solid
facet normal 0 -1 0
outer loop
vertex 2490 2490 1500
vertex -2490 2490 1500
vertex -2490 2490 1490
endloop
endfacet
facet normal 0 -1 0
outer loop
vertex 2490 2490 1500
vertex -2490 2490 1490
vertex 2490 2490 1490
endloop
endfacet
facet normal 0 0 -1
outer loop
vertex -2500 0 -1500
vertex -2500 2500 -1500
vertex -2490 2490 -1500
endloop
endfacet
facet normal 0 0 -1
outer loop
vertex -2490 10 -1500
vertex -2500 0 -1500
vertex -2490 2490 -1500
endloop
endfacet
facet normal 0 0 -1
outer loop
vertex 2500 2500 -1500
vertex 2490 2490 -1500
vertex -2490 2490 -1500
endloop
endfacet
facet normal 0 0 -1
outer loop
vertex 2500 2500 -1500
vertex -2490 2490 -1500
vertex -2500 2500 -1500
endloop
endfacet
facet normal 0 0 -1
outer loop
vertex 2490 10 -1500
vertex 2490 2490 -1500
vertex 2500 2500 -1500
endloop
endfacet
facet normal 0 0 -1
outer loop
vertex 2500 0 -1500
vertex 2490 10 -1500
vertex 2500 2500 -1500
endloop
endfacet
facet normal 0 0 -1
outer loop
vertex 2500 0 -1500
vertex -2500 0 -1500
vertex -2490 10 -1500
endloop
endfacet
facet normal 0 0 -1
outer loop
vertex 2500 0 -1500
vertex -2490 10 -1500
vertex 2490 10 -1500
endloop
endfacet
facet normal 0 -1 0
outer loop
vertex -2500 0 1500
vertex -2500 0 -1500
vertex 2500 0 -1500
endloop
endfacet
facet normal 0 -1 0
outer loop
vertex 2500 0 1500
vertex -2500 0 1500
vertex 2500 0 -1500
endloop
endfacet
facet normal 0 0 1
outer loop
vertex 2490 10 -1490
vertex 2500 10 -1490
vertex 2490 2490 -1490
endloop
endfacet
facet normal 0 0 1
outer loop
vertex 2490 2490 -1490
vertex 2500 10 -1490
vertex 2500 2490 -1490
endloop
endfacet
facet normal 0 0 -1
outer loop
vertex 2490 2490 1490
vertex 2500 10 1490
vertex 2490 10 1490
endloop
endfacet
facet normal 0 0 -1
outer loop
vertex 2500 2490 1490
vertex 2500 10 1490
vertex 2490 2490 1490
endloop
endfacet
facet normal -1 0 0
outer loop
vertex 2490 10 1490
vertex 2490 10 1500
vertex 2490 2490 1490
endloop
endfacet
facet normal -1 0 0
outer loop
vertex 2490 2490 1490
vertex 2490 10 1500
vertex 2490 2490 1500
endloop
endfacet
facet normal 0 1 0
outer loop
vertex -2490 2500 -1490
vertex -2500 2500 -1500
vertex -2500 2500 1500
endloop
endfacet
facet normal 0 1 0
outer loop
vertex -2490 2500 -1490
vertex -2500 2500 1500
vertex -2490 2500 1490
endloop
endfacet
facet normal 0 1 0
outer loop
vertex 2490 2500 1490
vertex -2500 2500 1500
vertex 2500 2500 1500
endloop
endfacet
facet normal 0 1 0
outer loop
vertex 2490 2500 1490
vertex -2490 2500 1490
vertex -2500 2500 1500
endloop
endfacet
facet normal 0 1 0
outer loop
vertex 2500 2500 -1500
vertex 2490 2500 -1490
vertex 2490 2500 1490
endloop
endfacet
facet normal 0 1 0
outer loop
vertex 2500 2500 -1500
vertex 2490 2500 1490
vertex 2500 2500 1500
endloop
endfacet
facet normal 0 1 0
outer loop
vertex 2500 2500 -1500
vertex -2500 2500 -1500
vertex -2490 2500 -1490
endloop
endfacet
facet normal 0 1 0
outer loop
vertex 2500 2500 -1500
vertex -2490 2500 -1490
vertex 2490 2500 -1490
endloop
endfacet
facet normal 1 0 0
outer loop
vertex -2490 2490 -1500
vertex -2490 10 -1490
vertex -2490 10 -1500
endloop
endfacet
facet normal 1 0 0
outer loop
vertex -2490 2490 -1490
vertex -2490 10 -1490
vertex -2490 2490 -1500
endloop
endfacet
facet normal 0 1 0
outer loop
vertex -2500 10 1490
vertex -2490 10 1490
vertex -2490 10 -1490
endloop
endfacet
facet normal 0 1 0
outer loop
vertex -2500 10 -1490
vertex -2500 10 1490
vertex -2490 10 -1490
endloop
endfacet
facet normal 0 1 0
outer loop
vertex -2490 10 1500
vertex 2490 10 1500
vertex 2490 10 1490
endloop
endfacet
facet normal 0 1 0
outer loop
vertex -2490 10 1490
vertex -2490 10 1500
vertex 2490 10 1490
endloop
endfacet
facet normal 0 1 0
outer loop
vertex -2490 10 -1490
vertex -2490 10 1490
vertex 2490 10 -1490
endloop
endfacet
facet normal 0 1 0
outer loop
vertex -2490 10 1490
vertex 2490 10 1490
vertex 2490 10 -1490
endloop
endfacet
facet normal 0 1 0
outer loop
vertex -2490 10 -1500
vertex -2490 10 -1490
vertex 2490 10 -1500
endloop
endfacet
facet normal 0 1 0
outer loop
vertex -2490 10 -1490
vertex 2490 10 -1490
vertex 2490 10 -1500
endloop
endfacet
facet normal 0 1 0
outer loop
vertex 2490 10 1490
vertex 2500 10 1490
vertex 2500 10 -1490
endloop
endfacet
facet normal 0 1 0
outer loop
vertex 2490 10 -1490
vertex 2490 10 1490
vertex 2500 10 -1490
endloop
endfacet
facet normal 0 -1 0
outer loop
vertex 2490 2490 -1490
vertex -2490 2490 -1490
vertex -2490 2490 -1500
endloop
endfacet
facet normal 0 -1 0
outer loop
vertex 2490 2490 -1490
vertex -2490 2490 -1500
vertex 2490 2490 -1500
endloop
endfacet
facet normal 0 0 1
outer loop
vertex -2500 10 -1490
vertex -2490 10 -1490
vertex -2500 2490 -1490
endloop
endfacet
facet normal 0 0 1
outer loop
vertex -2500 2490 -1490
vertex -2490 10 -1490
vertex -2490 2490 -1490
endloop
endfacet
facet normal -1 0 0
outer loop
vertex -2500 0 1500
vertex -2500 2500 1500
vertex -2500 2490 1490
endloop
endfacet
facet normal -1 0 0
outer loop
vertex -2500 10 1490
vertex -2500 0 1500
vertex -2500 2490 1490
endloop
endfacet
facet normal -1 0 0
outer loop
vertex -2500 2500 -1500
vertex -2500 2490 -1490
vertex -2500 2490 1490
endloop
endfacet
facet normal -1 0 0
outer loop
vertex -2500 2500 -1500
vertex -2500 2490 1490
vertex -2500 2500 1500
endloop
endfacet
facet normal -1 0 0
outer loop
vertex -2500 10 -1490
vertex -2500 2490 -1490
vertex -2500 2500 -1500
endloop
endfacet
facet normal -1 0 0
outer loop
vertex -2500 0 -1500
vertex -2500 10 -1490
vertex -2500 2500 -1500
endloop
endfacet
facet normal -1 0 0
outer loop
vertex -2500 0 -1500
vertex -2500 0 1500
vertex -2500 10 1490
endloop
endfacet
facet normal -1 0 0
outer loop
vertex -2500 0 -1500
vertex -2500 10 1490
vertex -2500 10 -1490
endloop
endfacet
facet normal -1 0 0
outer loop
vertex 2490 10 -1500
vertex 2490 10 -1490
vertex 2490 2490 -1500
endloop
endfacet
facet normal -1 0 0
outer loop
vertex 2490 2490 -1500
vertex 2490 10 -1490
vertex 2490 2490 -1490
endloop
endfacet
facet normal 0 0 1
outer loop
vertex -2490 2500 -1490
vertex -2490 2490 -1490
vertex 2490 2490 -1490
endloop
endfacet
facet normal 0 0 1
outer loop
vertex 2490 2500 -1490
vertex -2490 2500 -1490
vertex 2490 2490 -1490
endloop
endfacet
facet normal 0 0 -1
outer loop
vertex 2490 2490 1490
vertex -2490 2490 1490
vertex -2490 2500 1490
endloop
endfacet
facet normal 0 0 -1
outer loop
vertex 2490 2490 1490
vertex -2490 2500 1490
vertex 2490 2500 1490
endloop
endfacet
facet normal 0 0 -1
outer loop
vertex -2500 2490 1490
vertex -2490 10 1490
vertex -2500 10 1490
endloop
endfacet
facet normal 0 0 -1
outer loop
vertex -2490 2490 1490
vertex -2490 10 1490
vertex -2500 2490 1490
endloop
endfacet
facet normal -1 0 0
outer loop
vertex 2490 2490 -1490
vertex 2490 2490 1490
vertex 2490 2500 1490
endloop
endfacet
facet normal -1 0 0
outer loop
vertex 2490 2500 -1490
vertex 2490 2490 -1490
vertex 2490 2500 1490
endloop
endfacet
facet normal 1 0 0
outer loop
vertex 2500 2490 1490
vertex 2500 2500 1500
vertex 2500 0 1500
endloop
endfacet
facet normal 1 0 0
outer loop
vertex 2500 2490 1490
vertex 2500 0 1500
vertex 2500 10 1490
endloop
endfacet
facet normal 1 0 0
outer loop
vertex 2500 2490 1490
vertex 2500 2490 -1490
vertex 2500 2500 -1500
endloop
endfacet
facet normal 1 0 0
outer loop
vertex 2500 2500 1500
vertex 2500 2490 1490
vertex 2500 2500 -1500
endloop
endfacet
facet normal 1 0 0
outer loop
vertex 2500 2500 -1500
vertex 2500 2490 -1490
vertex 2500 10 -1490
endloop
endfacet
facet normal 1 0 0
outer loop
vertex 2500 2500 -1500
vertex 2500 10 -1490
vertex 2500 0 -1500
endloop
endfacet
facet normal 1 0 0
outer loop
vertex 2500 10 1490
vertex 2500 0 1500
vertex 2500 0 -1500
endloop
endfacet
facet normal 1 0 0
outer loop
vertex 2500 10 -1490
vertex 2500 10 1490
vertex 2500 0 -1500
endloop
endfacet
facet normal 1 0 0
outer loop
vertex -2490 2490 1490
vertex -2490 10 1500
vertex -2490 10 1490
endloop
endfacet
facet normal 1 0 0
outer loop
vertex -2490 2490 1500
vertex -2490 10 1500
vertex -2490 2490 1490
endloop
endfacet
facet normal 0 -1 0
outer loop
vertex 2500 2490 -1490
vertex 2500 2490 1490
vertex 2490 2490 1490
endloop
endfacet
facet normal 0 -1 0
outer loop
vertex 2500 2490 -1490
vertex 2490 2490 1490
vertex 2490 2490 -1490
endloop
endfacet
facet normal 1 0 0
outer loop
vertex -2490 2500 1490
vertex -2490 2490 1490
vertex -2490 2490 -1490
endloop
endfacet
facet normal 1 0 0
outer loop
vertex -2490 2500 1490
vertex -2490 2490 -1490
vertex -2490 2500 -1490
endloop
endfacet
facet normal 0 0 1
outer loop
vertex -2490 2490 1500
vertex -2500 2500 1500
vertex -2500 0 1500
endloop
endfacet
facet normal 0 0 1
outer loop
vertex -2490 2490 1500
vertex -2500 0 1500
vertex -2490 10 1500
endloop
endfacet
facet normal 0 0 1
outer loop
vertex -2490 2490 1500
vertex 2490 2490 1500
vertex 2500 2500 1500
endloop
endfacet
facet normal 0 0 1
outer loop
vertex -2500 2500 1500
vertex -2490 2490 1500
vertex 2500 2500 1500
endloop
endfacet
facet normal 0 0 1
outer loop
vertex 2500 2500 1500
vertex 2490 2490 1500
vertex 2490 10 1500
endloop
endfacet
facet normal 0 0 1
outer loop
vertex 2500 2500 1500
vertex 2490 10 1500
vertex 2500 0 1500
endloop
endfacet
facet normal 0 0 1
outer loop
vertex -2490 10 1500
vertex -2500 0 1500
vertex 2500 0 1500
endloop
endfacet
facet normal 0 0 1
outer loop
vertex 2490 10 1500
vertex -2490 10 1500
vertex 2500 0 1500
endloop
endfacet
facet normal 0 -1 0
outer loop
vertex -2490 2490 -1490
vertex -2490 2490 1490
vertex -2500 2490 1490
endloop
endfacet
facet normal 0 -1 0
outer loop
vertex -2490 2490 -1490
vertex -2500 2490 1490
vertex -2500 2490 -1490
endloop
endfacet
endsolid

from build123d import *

# Parameters (mm, degrees)
SKETCH_1_W          = 5000
SKETCH_1_H          = 3000
EXTRUDE_1_DEPTH     = 2500
SHELL_1_T           = -10
SKETCH_4_W          = 4980
SKETCH_4_H          = 2480
CUT_EXTRUDE_5_DEPTH = 4637.809247748
SKETCH_5_W          = 2980
SKETCH_5_H          = 2480
CUT_EXTRUDE_6_DEPTH = 5788.918451395


with BuildPart() as part:
    # 草图1 → 凸台-拉伸1 (new body)
    with BuildSketch(Plane(origin=(0, 0, 0), x_dir=(1, 0, 0), z_dir=(0, 1, 0))):
        Rectangle(SKETCH_1_W, SKETCH_1_H)
    extrude(amount=EXTRUDE_1_DEPTH)

    # 抽壳1
    shell_1_openings = [part.faces().sort_by_distance(p)[0] for p in [
        (0, 2500, 0),
    ]]
    offset(amount=SHELL_1_T, openings=shell_1_openings, kind=Kind.INTERSECTION)

    # 草图4 → 切除-拉伸5 (cut, through all)
    with BuildSketch(Plane.XY.offset(1500)):
        with Locations((0, 1250)):
            Rectangle(SKETCH_4_W, SKETCH_4_H)
    extrude(amount=-CUT_EXTRUDE_5_DEPTH, mode=Mode.SUBTRACT)

    # 草图5 → 切除-拉伸6 (cut, through all)
    with BuildSketch(Plane(origin=(2500, 0, 0), x_dir=(0, 0, -1), z_dir=(1, 0, 0))):
        with Locations((0, 1250)):
            Rectangle(SKETCH_5_W, SKETCH_5_H)
    extrude(amount=-CUT_EXTRUDE_6_DEPTH, mode=Mode.SUBTRACT)


solid = part.part
